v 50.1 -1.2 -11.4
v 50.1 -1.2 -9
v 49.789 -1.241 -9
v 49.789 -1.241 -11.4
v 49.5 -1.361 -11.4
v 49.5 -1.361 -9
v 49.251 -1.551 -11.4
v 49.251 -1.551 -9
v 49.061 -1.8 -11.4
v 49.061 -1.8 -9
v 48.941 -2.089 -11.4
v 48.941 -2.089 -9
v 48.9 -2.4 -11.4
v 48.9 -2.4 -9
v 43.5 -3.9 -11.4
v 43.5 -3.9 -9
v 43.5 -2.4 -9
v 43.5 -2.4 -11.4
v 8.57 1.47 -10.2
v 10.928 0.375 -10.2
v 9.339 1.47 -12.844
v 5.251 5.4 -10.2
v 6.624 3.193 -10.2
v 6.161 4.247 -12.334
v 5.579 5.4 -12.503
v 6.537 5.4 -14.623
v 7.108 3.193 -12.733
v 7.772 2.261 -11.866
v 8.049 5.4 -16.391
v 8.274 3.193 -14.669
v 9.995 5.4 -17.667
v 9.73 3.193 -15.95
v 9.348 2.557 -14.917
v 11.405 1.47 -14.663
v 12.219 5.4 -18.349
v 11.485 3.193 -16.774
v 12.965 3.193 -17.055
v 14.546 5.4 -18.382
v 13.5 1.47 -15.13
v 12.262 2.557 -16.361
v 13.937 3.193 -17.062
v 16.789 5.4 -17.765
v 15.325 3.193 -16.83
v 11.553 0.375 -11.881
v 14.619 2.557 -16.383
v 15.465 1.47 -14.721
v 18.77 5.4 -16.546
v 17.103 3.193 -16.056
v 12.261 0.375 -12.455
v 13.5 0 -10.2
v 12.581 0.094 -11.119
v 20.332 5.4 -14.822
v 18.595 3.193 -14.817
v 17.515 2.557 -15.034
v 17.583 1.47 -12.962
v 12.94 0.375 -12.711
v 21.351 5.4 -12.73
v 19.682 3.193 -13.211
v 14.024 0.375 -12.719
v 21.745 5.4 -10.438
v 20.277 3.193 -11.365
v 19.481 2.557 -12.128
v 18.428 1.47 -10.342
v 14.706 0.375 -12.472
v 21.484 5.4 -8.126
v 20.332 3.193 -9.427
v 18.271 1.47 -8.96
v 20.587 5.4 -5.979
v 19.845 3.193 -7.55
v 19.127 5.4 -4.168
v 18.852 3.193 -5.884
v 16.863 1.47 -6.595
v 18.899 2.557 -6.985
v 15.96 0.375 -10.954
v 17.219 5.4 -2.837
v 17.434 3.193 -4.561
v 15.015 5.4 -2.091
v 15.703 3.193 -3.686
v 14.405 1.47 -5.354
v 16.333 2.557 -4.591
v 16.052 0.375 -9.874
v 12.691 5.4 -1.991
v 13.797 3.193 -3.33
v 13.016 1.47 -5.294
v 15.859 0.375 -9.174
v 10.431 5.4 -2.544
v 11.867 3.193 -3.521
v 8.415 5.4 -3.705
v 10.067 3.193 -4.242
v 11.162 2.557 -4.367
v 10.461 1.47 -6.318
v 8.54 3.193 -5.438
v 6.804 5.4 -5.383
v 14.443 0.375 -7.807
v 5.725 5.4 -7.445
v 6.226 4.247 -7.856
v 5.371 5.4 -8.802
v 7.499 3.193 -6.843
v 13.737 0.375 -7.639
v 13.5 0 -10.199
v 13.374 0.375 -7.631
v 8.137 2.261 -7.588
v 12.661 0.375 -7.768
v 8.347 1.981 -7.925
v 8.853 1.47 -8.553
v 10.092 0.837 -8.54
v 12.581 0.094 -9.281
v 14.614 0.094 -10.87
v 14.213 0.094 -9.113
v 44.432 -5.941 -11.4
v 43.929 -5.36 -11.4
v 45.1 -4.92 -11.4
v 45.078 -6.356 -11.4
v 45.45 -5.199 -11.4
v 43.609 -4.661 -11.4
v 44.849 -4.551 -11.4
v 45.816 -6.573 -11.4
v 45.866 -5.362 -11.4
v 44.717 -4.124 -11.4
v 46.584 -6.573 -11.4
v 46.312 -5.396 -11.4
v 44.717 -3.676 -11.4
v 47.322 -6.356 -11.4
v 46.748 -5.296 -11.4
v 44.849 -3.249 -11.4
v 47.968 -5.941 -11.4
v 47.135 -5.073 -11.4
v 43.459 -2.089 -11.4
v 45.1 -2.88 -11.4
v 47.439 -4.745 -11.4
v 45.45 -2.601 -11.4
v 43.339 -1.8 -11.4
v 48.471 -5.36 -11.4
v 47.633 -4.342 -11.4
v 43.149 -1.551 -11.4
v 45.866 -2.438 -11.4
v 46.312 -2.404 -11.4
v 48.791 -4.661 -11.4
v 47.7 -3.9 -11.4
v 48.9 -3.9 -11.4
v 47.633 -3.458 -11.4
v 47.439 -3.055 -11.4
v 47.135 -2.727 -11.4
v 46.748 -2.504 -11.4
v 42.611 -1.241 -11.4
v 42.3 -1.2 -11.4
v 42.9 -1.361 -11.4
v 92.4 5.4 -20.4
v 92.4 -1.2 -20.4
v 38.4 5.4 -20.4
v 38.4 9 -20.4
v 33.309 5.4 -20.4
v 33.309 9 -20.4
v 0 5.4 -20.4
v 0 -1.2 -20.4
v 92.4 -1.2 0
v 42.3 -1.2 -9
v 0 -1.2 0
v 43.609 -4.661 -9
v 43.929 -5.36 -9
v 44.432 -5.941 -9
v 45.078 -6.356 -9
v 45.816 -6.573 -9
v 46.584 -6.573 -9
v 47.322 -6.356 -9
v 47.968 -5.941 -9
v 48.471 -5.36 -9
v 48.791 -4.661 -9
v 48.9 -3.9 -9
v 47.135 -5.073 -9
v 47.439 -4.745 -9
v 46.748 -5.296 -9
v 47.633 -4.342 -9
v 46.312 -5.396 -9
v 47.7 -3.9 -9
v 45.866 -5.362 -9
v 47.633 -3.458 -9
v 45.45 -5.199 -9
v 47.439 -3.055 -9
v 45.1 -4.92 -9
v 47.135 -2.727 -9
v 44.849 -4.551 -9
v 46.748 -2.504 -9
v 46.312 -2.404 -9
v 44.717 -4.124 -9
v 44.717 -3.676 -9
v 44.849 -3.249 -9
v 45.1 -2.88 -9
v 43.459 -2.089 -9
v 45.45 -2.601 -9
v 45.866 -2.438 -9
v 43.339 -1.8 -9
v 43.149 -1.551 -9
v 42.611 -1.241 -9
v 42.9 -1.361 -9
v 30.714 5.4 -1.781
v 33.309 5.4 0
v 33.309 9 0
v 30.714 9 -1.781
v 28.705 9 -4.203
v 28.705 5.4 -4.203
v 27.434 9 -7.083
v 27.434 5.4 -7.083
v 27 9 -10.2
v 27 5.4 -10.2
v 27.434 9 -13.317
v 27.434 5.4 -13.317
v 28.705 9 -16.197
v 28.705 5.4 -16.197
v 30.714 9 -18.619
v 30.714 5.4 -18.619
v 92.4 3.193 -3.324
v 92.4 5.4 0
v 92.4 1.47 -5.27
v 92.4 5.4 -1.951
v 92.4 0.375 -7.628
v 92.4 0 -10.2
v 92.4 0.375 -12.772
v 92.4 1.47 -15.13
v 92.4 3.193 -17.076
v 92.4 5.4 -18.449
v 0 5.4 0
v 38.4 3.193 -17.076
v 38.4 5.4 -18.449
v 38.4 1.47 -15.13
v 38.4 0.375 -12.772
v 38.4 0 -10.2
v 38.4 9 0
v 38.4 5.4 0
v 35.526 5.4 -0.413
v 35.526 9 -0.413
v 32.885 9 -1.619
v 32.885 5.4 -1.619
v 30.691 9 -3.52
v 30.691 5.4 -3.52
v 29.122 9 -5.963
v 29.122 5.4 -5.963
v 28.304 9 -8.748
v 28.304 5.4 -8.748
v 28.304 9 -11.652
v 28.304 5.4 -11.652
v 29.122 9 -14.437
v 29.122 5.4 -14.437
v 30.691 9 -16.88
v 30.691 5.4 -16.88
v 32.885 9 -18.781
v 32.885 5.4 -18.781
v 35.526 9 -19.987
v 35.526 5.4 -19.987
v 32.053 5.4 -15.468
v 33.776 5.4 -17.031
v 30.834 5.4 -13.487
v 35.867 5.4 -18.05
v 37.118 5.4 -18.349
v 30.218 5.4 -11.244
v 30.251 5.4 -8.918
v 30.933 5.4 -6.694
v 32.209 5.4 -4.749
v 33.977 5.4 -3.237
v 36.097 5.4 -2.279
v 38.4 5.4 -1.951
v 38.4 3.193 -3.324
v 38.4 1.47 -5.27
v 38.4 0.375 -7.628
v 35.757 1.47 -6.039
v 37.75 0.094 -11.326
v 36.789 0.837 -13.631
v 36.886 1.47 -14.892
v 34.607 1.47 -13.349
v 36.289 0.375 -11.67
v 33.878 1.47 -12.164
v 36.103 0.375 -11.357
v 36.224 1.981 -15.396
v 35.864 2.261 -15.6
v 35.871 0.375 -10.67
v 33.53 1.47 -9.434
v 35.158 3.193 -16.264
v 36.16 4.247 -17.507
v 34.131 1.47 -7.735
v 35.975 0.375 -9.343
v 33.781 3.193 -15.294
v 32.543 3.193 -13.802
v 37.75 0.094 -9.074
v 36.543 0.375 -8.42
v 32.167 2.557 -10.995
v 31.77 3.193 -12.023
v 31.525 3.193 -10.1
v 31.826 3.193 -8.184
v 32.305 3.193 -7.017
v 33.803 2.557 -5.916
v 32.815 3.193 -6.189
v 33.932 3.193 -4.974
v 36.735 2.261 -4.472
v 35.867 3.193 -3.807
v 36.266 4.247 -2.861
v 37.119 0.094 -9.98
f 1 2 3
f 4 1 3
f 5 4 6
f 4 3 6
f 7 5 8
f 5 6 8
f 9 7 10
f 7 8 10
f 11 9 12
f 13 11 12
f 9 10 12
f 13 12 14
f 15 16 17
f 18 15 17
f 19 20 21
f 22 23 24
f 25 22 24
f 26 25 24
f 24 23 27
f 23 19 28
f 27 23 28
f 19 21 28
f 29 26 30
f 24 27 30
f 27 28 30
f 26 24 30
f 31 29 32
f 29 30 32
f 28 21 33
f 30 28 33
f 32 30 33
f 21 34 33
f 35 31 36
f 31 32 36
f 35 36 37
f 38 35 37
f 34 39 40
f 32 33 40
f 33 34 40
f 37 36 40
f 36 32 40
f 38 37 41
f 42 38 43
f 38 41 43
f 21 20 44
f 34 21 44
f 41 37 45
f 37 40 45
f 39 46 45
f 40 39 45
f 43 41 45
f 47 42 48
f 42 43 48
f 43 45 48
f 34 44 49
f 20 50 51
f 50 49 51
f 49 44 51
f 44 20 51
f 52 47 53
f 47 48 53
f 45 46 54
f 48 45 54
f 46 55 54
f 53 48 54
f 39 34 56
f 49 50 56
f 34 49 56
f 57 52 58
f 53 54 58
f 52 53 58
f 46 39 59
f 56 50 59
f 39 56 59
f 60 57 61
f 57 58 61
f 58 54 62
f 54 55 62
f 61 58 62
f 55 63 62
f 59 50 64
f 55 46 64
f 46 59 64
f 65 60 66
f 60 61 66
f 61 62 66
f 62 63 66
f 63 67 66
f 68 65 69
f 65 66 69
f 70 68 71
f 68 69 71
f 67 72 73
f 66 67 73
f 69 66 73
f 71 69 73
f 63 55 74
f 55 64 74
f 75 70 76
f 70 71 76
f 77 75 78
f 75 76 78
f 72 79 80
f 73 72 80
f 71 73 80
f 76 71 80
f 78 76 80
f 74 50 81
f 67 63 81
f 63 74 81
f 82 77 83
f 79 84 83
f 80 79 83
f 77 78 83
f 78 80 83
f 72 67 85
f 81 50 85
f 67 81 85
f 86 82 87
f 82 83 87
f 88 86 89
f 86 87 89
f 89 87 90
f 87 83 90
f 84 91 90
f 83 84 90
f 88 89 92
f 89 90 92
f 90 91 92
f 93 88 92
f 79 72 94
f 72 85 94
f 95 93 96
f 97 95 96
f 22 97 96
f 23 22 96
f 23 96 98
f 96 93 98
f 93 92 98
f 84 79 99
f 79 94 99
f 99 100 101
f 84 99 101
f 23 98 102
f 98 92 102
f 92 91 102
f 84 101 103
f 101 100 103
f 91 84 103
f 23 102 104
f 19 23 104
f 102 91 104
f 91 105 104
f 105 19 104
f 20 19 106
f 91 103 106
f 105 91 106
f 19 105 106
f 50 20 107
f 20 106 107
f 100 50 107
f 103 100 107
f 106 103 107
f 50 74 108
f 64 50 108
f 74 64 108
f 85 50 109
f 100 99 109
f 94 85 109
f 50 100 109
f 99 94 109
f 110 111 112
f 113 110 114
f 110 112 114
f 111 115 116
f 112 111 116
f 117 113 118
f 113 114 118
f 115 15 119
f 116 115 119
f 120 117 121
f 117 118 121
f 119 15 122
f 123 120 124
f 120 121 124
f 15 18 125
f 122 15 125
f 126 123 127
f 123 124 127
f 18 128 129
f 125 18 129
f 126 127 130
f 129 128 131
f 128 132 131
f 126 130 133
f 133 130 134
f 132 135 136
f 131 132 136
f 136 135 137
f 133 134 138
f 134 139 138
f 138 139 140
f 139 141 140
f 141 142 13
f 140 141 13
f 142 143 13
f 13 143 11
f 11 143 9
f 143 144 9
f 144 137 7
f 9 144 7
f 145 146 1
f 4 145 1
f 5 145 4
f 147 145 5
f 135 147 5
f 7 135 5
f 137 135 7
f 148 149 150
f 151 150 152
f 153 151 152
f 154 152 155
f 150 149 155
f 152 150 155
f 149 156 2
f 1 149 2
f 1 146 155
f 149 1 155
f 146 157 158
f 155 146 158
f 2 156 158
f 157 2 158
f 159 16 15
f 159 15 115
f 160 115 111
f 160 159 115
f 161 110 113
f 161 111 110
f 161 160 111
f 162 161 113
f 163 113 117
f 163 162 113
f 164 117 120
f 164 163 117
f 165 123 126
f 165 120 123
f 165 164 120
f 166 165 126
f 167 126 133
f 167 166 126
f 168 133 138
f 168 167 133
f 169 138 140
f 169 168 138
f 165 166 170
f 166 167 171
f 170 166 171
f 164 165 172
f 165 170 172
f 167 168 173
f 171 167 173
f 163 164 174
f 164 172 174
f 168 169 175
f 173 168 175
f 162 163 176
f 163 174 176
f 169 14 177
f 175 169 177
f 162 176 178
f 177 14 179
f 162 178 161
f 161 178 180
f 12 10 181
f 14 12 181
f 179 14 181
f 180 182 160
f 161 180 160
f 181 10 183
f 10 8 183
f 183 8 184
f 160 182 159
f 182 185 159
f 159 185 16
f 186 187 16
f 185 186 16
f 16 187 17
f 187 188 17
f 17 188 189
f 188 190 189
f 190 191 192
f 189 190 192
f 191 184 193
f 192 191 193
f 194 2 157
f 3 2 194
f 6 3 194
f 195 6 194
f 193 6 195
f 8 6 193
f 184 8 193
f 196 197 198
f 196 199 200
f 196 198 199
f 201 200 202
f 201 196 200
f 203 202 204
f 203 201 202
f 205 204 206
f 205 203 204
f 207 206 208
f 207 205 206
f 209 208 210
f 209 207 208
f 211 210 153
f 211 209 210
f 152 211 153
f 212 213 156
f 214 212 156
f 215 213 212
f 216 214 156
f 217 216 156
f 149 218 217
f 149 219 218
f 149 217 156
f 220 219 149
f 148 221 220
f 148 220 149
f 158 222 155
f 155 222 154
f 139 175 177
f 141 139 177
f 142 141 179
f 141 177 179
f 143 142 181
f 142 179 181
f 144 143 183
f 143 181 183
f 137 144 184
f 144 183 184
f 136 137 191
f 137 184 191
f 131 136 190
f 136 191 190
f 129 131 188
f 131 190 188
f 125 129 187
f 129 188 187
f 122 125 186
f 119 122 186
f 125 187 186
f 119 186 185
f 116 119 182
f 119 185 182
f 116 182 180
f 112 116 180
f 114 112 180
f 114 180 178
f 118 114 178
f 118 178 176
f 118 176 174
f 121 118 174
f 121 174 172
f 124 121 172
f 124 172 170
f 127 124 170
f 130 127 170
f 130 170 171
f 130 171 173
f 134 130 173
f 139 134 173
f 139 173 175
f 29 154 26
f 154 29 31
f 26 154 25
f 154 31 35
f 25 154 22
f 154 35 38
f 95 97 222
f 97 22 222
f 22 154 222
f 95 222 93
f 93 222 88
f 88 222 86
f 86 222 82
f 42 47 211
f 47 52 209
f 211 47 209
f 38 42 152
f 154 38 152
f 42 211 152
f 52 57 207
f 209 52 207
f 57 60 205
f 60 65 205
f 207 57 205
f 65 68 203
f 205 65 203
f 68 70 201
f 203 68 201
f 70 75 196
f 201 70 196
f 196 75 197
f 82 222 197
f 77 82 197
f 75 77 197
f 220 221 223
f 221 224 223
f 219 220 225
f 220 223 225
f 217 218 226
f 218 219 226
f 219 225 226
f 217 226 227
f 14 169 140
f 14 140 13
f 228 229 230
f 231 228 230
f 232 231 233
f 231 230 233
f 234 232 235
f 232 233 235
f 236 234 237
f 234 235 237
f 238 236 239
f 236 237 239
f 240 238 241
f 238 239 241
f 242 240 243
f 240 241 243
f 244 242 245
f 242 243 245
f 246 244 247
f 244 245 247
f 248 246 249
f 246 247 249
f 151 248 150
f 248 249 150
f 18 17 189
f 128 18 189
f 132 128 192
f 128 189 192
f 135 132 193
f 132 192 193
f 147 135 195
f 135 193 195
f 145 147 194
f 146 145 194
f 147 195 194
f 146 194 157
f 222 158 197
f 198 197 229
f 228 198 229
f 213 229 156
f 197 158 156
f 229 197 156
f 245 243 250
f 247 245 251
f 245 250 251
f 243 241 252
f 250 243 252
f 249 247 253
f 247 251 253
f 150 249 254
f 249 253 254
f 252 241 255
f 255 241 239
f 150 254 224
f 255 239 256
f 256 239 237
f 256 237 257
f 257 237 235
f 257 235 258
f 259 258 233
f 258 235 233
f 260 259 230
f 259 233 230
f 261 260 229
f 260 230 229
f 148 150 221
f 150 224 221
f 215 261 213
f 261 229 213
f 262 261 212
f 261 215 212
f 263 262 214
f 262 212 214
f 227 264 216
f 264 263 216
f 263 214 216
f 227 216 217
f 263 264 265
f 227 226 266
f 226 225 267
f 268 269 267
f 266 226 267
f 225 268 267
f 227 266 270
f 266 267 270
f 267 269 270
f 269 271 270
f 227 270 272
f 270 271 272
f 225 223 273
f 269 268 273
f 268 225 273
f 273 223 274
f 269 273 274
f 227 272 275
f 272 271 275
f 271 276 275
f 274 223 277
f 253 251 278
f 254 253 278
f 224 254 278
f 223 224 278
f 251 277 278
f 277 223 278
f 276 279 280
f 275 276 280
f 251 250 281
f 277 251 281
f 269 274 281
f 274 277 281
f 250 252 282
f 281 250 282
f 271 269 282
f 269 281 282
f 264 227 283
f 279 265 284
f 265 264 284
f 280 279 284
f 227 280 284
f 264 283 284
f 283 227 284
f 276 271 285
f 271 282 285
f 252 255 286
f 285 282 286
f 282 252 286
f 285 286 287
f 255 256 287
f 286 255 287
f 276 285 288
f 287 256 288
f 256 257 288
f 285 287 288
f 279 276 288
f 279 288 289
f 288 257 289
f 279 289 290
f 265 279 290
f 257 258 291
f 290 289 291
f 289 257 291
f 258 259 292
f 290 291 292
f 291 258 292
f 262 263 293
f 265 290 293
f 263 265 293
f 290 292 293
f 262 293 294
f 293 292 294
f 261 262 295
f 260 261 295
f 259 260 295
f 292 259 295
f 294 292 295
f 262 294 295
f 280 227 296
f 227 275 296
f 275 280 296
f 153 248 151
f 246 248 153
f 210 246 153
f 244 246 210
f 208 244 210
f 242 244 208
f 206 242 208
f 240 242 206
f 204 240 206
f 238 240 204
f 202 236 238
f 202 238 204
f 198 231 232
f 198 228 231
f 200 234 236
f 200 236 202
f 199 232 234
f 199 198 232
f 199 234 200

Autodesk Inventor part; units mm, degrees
ref_plane "YZ Plane" through (0, 0, 0) normal (1, 0, 0) x (0, 1, 0)
ref_plane "XZ Plane" through (0, 0, 0) normal (0, 1, 0) x (-1, 0, 0)
ref_plane "XY Plane" through (0, 0, 0) normal (0, 0, 1) x (1, 0, 0)
sketch "Esboço2" plane through (0, 0, 0) normal (0, 1, 0) x (-1, 0, 0)
  line L0 (-33.3088, 0) -> (-92.4, 0)
  line L1 (-92.4, 0) -> (-92.4, -20.4)
  line L2 (-92.4, -20.4) -> (-33.3088, -20.4)
  line L3 (-38.4, -19.2) -> (-92.4, -19.2)
  line L4 (-92.4, -1.2) -> (-38.4, -1.2)
  circle A0 centre (-38.4, -10.2) radius 9
  line L5 (-47.4, -20.4) -> (-47.4, -19.2)
  line L6 (-47.4, -1.2) -> (-47.4, 0)
  arc A1 (-33.3088, -20.4) -> (-33.3088, 0) centre (-38.4, -10.2) ccw
  arc A2 (-38.4, -20.4) -> (-38.4, 0) centre (-38.4, -10.2) ccw
  line L7 (-33.3088, 0) -> (0, 0)
  line L8 (0, 0) -> (0, -20.4)
  line L9 (0, -20.4) -> (-33.3088, -20.4)
  circle A3 centre (-13.5, -10.2) radius 9
  point P0 (0, -10.2)
  point P1 (-33.3088, -20.4)
  dimension "d6" = 20.4
  dimension "d8" = 1.2
  dimension "d11" = 1.2
  dimension "d25" = 18
  dimension "d44" = 1.2
  dimension "d45" = 1.2
  dimension "d46" = 54
  dimension "d47" = 27
  dimension "d48" = 18
  dimension "d49" = 13.5
extrude "Extrusão1" add sketch "Esboço2" against normal blind 1.2 contours A1 L2 A2 L0 | L7 L8 L9 A1 | A2 L2 L5 L3 A0 L4 L6 L0 | L6 L4 L1 L0 | L4 A0 L3 L1 | L2 L1 L3 L5 | A0 | A3
extrude "Extrusão2" add sketch "Esboço2" along normal blind 9 contours L7 L8 L9 A1 | A2 L2 L5 L3 A0 L4 L6 L0 | L6 L4 L1 L0 | L2 L1 L3 L5
fillet "Arredondamento6" radius 9 4 edges at (65.4, 0, -1.2) (65.4, 0, -19.2) (29.4, 0, -10.2) (22.5, 0, -10.2)
sketch "Esboço6" plane through (0, -1.2, 0) normal (0, 0, 1) x (1, 0, 0)
  line L0 (92.4, 10.2) -> (0, 10.2)
  line L1 (0, 10.2) -> (0, 6.6)
  line L2 (0, 6.6) -> (92.4, 6.6)
  line L3 (92.4, 6.6) -> (92.4, 10.2)
  line L4 (92.4, 1.2) -> (92.4, 10.2) projected
  line L5 (0, 10.2) -> (0, 0) projected
  line L6 (38.4, 10.2) -> (92.4, 10.2) projected
  line L7 (38.4, 1.2) -> (92.4, 1.2) projected
  point P0 (0, 1.2)
  point P1 (92.4, 8.4)
  point P2 (92.4, 5.7)
  point P3 (0, 8.4)
  point P4 (0, 5.1)
  point P5 (46.2, 10.2)
  point P6 (65.4, 10.2)
  dimension "d50" = 5.4
extrude "Extrusão8" cut sketch "Esboço6" against normal up to surface (20.4 mm away)
extrude "Extrusão9" add sketch "Esboço2" along normal blind 9 contours A1 L2 A2 L0
sketch "Esboço7" plane through (0, -1.2, 0) normal (0, -1, 0) x (1, 0, 0)
  line L0 (42.3, -11.4) -> (50.1, -11.4)
  line L1 (50.1, -11.4) -> (50.1, -9)
  line L2 (50.1, -9) -> (42.3, -9)
  line L3 (42.3, -9) -> (42.3, -11.4)
  line L4 (0, 0) -> (0, -20.4) projected
  arc A0 (38.4, 0) -> (38.4, -20.4) centre (38.4, -10.2) ccw projected
  line L5 (92.4, -20.4) -> (92.4, 0) projected
  point P0 (42.3, -10.2)
  point P1 (0, -10.2)
  point P2 (46.2, -9)
  point P3 (28.2, -10.2)
  dimension "d56" = 7.8
  dimension "d57" = 2.4
  dimension "d76" = 42.3
  dimension "d77" = 42.3
extrude "Extrusão10" add sketch "Esboço7" along normal blind 5.4
sketch "Esboço8" plane through (42.3, -1.2, -9) normal (0, 0, 1) x (1, 0, 0)
  circle A0 centre (3.9, -2.7) radius 1.5
  line L0 (50.1, 0) -> (-42.3, 0) projected
  line L1 (7.8, 0) -> (7.8, -5.4)
  line L2 (0, 0) -> (0, -5.4)
  line L3 (7.8, -5.4) -> (0, -5.4) projected
  line L4 (7.8, -5.4) -> (0, -5.4)
  arc A1 (1.2, -2.7) -> (6.6, -2.7) centre (3.9, -2.7) ccw
  line L5 (1.2, -2.7) -> (1.2, -1.2)
  line L6 (6.6, -2.7) -> (6.6, -1.2)
  line L7 (0, 0) -> (0, 0)
  line L8 (7.8, 0) -> (7.8, 0)
  arc A2 (1.2, -1.2) -> (0, 0) centre (0, -1.2) ccw
  arc A3 (7.8, 0) -> (6.6, -1.2) centre (7.8, -1.2) ccw
  line L9 (0, 0) -> (7.8, 0) projected
  point P0 (-42.3, 1.2)
  point P1 (3.9, 0)
  point P2 (1.2, 0)
  point P3 (6.6, 0)
  point P4 (1.2, 0)
  point P5 (6.6, 0)
  point P6 (3.9, -5.4)
  point P7 (3.9, 0)
  dimension "d60" = 3
  dimension "d61" = 2.7
  dimension "d63" = 1.2
  dimension "d64" = 1.2
extrude "Extrusão11" cut sketch "Esboço8" against normal up to surface (2.4 mm away) contours A0 | L1 L3 A1 L6 A3 | A2 L5 A1 L3 L2
equation "\"d6\" = Diâmetro_esfera + 2 * Margem"
equation "\"d8\" = Margem"
equation "\"d11\" = Margem"
equation "\"d25\" = Diâmetro_esfera"
equation "\"d44\" = Margem"
equation "\"d45\" = Margem"
equation "\"d46\" = 3 * Diâmetro_esfera"
equation "\"d48\" = Diâmetro_esfera"
equation "\"d49\" = 0.5 * d47"
equation "\"d13\" = Margem"
equation "\"d15\" = 0.5 * Diâmetro_esfera"
equation "\"d55\" = 0.5 * Diâmetro_esfera"
equation "\"d50\" = 0.3 * Diâmetro_esfera"
equation "\"d53\" = 0.5 * Diâmetro_esfera"
equation "\"d56\" = Parafuso + 4 * Margem"
equation "\"d57\" = 2 * Margem"
equation "\"d58\" = Parafuso + 2 * Margem"
equation "\"d60\" = Parafuso"
equation "\"d61\" = 0.5 * Parafuso + Margem"
equation "\"d63\" = Margem"
equation "\"Diâmetro_esfera\" = 18"
equation "\"Margem\" = 3 * Filamento"
equation "\"Filamento\" = 0.4"
equation "\"Parafuso\" = 3"
equation "\"d42\" = Margem"
equation "\"d43\" = Margem"
equation "\"Tamanho_receptor\" = 37.257"
properties part number "Trilho 60 minutos  - 12 horas" material "Plástico PET"
